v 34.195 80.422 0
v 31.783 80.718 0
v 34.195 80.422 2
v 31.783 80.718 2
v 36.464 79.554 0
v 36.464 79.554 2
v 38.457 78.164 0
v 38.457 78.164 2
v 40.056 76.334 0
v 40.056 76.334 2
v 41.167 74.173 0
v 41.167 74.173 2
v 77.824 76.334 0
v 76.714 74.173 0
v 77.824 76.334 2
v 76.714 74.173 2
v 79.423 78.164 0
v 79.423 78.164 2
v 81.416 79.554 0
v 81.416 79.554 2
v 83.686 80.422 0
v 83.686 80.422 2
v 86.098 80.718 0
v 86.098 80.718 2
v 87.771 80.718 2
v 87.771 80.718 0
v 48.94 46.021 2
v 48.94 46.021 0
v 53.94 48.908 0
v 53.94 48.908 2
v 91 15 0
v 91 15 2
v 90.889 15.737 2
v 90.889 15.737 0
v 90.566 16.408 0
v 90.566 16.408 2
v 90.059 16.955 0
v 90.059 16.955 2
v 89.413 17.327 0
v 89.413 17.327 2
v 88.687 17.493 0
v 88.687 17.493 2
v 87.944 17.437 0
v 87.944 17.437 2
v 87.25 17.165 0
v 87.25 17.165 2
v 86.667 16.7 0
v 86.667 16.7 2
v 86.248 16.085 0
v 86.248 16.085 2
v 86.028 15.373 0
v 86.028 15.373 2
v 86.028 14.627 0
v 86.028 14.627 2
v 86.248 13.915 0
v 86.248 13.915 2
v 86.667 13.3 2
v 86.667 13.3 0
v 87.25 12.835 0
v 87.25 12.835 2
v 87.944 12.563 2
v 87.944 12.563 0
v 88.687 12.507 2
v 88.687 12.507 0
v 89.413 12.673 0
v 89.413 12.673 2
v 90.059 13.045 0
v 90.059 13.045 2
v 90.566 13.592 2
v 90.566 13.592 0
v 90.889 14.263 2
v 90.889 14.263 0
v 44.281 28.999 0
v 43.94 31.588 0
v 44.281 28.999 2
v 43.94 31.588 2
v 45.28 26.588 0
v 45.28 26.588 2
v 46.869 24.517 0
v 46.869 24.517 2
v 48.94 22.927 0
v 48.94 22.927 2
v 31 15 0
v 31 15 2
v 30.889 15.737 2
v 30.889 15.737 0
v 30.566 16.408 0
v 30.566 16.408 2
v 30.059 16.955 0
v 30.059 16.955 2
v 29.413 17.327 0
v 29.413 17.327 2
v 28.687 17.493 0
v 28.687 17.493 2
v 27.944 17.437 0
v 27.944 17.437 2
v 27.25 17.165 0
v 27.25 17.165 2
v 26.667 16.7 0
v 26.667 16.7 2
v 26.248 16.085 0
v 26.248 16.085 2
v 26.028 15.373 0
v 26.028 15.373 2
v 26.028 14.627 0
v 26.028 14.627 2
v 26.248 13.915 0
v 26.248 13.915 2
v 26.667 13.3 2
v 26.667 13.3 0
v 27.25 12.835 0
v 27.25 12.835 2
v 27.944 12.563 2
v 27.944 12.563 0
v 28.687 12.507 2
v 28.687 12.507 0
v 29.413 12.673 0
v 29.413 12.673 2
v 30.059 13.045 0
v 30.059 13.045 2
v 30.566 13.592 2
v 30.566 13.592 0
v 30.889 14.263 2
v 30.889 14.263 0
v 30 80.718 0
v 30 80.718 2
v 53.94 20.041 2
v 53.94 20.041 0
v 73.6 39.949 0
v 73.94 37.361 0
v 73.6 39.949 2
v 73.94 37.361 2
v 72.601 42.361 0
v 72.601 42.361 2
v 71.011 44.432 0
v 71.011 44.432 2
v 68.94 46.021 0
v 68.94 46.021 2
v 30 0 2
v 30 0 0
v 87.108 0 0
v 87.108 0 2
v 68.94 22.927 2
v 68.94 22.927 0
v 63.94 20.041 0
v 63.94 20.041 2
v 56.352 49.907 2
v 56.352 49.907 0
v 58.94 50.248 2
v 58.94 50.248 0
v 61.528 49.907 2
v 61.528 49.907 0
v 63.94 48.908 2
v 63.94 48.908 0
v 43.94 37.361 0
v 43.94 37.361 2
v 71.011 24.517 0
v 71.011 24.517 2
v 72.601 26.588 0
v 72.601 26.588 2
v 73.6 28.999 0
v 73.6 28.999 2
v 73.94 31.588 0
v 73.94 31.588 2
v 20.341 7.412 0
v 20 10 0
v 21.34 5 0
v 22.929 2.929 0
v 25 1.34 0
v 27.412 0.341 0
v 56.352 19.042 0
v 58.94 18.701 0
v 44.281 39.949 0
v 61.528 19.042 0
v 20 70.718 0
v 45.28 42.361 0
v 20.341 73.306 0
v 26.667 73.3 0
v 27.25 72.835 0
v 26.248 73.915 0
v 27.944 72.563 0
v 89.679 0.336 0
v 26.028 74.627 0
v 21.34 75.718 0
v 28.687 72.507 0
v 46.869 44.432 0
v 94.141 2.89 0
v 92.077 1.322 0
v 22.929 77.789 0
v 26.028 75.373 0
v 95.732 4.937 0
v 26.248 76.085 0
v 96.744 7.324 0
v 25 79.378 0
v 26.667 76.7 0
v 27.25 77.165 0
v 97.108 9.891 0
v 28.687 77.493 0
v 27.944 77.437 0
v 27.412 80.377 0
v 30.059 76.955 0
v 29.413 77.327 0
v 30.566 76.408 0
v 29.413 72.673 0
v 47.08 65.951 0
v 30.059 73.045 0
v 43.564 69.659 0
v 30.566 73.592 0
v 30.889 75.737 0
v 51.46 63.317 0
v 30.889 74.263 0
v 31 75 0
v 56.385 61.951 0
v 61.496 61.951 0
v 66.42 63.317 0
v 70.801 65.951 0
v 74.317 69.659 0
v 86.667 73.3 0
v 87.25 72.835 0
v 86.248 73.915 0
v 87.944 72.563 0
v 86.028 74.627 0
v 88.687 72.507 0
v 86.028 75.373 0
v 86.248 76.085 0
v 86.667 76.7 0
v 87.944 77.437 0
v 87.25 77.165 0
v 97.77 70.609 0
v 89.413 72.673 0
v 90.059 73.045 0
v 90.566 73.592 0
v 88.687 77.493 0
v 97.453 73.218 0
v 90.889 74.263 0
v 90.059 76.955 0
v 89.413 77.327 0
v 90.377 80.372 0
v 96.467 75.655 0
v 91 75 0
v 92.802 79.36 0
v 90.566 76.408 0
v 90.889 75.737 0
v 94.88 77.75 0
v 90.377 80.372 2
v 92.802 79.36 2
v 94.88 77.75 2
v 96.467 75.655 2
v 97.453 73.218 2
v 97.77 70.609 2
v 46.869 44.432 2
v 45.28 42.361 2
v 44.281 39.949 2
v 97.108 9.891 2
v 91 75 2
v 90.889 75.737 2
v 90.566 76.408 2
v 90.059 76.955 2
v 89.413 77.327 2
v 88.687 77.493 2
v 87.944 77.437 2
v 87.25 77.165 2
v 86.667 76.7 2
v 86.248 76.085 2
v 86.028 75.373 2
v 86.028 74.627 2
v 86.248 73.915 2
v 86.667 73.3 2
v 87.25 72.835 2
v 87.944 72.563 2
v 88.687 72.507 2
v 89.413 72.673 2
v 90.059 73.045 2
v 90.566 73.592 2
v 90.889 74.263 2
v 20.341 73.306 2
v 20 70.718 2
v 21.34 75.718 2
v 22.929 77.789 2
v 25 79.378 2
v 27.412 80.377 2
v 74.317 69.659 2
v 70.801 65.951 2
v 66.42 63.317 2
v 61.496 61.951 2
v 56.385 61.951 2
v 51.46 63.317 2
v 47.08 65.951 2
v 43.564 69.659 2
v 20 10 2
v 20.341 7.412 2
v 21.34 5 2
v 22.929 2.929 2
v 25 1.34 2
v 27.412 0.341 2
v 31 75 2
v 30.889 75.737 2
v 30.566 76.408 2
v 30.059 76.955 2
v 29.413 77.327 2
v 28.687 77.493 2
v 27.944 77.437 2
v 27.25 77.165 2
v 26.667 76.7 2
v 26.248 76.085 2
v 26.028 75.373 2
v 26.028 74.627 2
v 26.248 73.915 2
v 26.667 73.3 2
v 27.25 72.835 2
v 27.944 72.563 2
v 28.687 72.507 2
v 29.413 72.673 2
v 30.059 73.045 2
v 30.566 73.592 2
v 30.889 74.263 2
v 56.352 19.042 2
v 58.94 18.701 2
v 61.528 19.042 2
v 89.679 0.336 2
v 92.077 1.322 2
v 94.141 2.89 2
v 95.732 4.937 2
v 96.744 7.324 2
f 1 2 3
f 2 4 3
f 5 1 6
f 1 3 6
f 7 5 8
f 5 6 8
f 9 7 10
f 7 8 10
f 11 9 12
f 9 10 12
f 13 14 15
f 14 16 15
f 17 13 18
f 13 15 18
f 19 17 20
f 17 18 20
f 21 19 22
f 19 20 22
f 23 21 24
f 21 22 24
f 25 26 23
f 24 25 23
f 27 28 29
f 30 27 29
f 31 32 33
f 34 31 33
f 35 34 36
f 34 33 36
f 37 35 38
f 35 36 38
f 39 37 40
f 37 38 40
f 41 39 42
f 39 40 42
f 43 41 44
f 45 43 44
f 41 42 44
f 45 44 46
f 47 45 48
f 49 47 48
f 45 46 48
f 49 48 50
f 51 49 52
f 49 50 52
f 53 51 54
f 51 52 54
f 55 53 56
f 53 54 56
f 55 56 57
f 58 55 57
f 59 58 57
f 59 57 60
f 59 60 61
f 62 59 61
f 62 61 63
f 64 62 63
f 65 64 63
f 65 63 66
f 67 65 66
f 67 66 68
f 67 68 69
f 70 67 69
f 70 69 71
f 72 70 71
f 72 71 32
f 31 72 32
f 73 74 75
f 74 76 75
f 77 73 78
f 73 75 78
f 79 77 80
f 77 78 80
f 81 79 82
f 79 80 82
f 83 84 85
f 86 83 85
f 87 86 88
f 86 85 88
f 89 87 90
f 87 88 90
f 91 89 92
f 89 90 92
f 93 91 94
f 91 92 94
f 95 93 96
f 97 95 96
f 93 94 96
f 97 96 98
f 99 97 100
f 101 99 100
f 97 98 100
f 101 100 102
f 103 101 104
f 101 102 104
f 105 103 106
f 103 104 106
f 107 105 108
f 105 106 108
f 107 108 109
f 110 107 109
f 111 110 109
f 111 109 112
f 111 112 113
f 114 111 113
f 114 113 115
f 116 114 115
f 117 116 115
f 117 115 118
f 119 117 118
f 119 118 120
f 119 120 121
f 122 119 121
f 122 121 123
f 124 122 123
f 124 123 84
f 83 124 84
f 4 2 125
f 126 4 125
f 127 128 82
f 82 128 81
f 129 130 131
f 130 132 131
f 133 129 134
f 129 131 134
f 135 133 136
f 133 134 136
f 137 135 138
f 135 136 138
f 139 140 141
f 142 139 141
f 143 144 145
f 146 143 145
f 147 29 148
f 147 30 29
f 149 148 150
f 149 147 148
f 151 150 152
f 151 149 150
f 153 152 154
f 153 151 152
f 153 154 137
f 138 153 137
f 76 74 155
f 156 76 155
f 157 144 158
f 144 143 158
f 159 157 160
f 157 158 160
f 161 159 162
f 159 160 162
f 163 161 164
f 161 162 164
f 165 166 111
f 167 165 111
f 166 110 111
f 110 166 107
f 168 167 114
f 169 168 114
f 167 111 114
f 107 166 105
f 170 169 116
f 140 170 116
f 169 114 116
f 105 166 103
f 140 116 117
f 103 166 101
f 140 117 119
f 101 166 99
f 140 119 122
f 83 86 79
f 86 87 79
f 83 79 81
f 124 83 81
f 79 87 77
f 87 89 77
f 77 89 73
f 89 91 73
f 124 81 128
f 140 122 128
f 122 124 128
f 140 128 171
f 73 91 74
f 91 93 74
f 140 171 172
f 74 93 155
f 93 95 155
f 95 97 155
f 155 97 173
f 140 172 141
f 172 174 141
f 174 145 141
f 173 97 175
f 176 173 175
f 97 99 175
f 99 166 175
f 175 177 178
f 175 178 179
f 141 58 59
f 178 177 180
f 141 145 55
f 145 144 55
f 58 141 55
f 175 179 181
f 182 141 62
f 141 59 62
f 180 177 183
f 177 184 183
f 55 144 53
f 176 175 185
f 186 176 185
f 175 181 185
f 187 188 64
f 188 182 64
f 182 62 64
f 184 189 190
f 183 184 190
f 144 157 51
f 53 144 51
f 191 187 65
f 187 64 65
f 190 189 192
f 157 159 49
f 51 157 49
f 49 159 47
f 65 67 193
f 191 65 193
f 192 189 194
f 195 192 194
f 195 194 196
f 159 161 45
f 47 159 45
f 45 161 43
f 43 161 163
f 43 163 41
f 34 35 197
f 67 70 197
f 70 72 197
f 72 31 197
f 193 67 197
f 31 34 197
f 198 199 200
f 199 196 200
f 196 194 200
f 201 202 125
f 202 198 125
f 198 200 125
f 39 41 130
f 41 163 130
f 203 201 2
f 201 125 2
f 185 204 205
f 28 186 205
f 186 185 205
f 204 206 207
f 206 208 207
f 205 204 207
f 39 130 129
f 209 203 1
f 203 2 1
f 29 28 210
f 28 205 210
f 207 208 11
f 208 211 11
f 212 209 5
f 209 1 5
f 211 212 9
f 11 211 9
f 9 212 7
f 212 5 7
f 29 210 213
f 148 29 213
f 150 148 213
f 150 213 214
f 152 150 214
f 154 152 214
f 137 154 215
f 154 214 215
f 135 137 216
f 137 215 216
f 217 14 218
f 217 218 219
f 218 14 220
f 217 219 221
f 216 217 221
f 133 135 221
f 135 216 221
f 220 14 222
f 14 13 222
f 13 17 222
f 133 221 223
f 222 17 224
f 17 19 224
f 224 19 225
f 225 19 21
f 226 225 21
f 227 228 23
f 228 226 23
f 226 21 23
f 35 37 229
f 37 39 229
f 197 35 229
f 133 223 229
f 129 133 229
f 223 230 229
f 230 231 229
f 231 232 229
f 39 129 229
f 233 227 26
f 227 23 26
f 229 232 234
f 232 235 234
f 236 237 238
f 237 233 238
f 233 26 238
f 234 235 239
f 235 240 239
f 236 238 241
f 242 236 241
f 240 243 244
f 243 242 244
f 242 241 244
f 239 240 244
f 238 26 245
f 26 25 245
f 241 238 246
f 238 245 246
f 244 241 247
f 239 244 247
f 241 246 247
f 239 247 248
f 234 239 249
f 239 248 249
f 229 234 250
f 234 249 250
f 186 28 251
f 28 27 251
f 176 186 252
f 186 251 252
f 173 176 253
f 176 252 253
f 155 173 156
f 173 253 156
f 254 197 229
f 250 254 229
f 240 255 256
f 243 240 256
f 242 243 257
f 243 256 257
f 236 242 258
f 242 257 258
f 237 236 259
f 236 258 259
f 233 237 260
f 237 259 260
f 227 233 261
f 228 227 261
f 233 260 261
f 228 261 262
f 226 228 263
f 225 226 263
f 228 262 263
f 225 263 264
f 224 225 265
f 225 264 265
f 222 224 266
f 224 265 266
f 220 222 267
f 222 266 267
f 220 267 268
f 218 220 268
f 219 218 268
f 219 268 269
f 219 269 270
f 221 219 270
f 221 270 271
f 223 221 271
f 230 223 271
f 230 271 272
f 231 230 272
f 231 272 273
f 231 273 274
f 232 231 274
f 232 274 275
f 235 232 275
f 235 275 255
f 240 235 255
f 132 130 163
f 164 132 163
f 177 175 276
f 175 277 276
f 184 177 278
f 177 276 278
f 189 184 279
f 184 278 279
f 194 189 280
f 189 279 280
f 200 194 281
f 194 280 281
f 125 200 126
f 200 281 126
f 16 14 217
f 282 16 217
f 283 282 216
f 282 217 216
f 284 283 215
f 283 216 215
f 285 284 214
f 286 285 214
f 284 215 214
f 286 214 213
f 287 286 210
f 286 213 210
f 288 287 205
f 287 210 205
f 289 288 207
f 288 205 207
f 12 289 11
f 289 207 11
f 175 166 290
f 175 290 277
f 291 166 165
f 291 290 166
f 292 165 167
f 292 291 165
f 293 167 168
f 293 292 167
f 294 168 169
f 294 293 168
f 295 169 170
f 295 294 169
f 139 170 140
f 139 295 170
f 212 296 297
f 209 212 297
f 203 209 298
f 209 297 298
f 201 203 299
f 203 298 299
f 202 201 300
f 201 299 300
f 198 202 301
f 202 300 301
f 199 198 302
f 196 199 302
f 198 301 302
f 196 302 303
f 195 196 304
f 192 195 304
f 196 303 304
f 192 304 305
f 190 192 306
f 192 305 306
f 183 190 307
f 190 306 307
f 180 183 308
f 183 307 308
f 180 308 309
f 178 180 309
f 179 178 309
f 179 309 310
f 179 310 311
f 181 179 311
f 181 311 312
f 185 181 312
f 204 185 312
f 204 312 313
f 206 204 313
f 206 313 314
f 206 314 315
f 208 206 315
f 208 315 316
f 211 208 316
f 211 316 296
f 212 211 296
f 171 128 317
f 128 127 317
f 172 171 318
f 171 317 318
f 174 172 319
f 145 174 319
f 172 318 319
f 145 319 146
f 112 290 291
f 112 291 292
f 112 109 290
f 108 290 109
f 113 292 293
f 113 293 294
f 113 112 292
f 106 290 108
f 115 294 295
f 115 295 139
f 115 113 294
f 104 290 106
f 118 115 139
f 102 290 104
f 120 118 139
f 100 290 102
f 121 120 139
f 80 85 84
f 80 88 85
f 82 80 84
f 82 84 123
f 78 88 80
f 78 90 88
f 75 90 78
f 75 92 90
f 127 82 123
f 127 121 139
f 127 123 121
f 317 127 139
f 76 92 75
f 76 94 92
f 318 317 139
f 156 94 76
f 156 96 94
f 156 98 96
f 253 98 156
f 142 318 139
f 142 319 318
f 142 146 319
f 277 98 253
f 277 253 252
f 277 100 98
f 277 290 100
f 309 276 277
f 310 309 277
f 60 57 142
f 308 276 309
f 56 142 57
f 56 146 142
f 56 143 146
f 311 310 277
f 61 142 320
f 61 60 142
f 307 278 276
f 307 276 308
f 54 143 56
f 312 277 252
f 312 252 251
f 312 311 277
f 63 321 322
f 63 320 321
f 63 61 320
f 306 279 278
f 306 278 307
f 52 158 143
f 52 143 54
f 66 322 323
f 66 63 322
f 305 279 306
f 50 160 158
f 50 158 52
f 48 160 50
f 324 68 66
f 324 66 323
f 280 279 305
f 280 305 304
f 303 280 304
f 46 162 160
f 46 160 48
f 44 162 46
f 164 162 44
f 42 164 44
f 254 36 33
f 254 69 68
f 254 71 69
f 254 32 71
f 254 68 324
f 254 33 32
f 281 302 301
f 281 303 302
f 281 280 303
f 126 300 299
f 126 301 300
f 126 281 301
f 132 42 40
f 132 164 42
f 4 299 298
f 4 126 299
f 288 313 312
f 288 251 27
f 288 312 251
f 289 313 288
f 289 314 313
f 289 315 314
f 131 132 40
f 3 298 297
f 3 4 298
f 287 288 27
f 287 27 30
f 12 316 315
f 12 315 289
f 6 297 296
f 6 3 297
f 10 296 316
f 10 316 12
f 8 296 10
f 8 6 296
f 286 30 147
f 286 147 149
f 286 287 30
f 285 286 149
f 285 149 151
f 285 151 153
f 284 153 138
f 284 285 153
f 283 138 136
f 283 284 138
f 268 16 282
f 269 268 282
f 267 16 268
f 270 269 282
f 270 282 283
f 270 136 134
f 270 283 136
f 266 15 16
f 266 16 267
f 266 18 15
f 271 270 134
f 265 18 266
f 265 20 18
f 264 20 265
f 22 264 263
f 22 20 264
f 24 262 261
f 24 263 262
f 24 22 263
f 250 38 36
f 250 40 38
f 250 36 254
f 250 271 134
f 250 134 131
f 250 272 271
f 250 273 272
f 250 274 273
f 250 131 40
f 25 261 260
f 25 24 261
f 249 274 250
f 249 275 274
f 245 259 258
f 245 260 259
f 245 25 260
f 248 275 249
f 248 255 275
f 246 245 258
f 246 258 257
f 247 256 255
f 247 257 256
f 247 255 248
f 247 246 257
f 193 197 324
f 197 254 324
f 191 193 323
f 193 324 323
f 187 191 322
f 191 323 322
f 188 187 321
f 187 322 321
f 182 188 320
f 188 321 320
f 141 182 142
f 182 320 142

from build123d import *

# Parameters (mm, degrees)
SKETCH1_W           = 117
SKETCH1_H           = 200
BOSS_EXTRUDE1_DEPTH = 2
CUT_EXTRUDE1_DEPTH  = 2
SKETCH3_R           = 2.5
SKETCH3_R_2         = 1.5
SKETCH3_R_3         = 12.5
CUT_EXTRUDE2_DEPTH  = 30
FILLET1_R           = 20
CUT_EXTRUDE3_DEPTH  = 10
FILLET2_R           = 10
CUT_EXTRUDE4_DEPTH  = 10
FILLET3_R           = 10
CUT_EXTRUDE5_DEPTH  = 10
FILLET4_R           = 10


with BuildPart() as part:
    # Sketch1 → Boss-Extrude1 (new body)
    with BuildSketch(Plane.XY):
        with Locations((58.5, 100)):
            Rectangle(SKETCH1_W, SKETCH1_H)
    extrude(amount=BOSS_EXTRUDE1_DEPTH)

    # Sketch2 → Cut-Extrude1 (cut)
    with BuildSketch(Plane.XY.offset(2)):
        Polygon((0, 120), (40, 200), (0, 200), align=None)
        Polygon((77, 200), (117, 120), (117, 200), align=None)
    extrude(amount=-CUT_EXTRUDE1_DEPTH, mode=Mode.SUBTRACT)

    # Sketch3 → Cut-Extrude2 (cut)
    with BuildSketch(Plane.XY.offset(2)):
        with Locations((58.5, 170)):
            Circle(SKETCH3_R)
        with Locations((58.5, 150)):
            Circle(SKETCH3_R)
        with Locations((28.5, 15)):
            Circle(SKETCH3_R)
        with Locations((88.5, 15)):
            Circle(SKETCH3_R)
        with Locations((28.5, 75)):
            Circle(SKETCH3_R)
        with Locations((88.5, 75)):
            Circle(SKETCH3_R)
        with Locations((43, 112.5)):
            Circle(SKETCH3_R_2)
        with Locations((43, 81.5)):
            Circle(SKETCH3_R_2)
        with Locations((74, 81.5)):
            Circle(SKETCH3_R_2)
        with Locations((74, 112.5)):
            Circle(SKETCH3_R_2)
        with Locations((58.5, 97)):
            Circle(SKETCH3_R_3)
    extrude(amount=-CUT_EXTRUDE2_DEPTH, mode=Mode.SUBTRACT)

    # Fillet1
    fillet1_edges = [part.edges().sort_by_distance(p)[0] for p in [
        (0, 120, 1),
        (40, 200, 1),
        (117, 120, 1),
        (77, 200, 1),
        (117, 0, 1),
        (0, 0, 1),
    ]]
    fillet(fillet1_edges, radius=FILLET1_R)

    # Sketch4 → Cut-Extrude3 (cut)
    with BuildSketch(Plane(origin=(0, 0, 0), x_dir=(-1, 0, 0), z_dir=(0, 0, -1))):
        with BuildLine():
            Line((-97, 0), (-98.708203932, 156.583592135))
            Line((-98.708203932, 156.583592135), (-114.88854382, 124.22291236))
            ThreePointArc((-114.88854382, 124.22291236), (-116.464979789, 119.873698861), (-117, 115.27864045))
            Line((-117, 115.27864045), (-117, 20))
            ThreePointArc((-117, 20), (-111.142135624, 5.857864376), (-97, 0))
        make_face()
        with BuildLine():
            Line((-20, 0), (-20, 160))
            Line((-20, 160), (-18.291796068, 156.583592135))
            Line((-18.291796068, 156.583592135), (-2.11145618, 124.22291236))
            ThreePointArc((-2.11145618, 124.22291236), (-0.535020211, 119.873698861), (0, 115.27864045))
            Line((0, 115.27864045), (0, 20))
            ThreePointArc((0, 20), (-5.857864376, 5.857864376), (-20, 0))
        make_face()
    extrude(amount=-CUT_EXTRUDE3_DEPTH, mode=Mode.SUBTRACT)

    # Fillet2
    fillet2_edges = [part.edges().sort_by_distance(p)[0] for p in [
        (97, 0, 1),
        (20, 0, 1),
        (98.708203932, 156.583592135, 1),
        (20, 160, 1),
    ]]
    fillet(fillet2_edges, radius=FILLET2_R)

    # Sketch5 → Cut-Extrude4 (cut)
    with BuildSketch(Plane(origin=(0, 0, 0), x_dir=(-1, 0, 0), z_dir=(0, 0, -1))):
        with BuildLine():
            Line((-97.880566934, 80.717724073), (-77.880566934, 80.717724073))
            ThreePointArc((-77.880566934, 80.717724073), (-58.940283467, 61.777440606), (-40, 80.717724073))
            Line((-40, 80.717724073), (-20, 80.717724073))
            Line((-20, 80.717724073), (-20, 83.819660113))
            Line((-20, 83.819660113), (-20, 157.639320225))
            ThreePointArc((-20, 157.639320225), (-20.267510105, 159.93684943), (-21.05572809, 162.11145618))
            Line((-21.05572809, 162.11145618), (-34.472135955, 188.94427191))
            ThreePointArc((-34.472135955, 188.94427191), (-41.846057533, 197.013016167), (-52.360679775, 200))
            Line((-52.360679775, 200), (-64.639320225, 200))
            ThreePointArc((-64.639320225, 200), (-75.153942467, 197.013016167), (-82.527864045, 188.94427191))
            Line((-82.527864045, 188.94427191), (-97.626690246, 158.746619509))
            ThreePointArc((-97.626690246, 158.746619509), (-98.427295018, 156.518894044), (-98.681823334, 154.165397904))
            Line((-98.681823334, 154.165397904), (-97.894862718, 82.028156127))
            Line((-97.894862718, 82.028156127), (-97.880566934, 80.717724073))
        make_face()
    extrude(amount=-CUT_EXTRUDE4_DEPTH, mode=Mode.SUBTRACT)

    # Fillet3
    fillet3_edges = [part.edges().sort_by_distance(p)[0] for p in [
        (40, 80.717724073, 1),
        (77.880566934, 80.717724073, 1),
        (20, 80.717724073, 1),
        (97.880566934, 80.717724073, 1),
    ]]
    fillet(fillet3_edges, radius=FILLET3_R)

    # Sketch6 → Cut-Extrude5 (cut)
    with BuildSketch(Plane(origin=(0, 0, 0), x_dir=(-1, 0, 0), z_dir=(0, 0, -1))):
        Polygon((-58.940283467, 51.794857369), (-73.940283467, 43.134603332), (-73.940283467, 25.814095256), (-58.940283467, 17.153841218), (-43.940283467, 25.814095256), (-43.940283467, 43.134603332), align=None)
    extrude(amount=-CUT_EXTRUDE5_DEPTH, mode=Mode.SUBTRACT)

    # Fillet4
    fillet4_edges = [part.edges().sort_by_distance(p)[0] for p in [
        (58.940283467, 51.794857369, 1),
        (43.940283467, 43.134603332, 1),
        (43.940283467, 25.814095256, 1),
        (58.940283467, 17.153841218, 1),
        (73.940283467, 25.814095256, 1),
        (73.940283467, 43.134603332, 1),
    ]]
    fillet(fillet4_edges, radius=FILLET4_R)


solid = part.part
